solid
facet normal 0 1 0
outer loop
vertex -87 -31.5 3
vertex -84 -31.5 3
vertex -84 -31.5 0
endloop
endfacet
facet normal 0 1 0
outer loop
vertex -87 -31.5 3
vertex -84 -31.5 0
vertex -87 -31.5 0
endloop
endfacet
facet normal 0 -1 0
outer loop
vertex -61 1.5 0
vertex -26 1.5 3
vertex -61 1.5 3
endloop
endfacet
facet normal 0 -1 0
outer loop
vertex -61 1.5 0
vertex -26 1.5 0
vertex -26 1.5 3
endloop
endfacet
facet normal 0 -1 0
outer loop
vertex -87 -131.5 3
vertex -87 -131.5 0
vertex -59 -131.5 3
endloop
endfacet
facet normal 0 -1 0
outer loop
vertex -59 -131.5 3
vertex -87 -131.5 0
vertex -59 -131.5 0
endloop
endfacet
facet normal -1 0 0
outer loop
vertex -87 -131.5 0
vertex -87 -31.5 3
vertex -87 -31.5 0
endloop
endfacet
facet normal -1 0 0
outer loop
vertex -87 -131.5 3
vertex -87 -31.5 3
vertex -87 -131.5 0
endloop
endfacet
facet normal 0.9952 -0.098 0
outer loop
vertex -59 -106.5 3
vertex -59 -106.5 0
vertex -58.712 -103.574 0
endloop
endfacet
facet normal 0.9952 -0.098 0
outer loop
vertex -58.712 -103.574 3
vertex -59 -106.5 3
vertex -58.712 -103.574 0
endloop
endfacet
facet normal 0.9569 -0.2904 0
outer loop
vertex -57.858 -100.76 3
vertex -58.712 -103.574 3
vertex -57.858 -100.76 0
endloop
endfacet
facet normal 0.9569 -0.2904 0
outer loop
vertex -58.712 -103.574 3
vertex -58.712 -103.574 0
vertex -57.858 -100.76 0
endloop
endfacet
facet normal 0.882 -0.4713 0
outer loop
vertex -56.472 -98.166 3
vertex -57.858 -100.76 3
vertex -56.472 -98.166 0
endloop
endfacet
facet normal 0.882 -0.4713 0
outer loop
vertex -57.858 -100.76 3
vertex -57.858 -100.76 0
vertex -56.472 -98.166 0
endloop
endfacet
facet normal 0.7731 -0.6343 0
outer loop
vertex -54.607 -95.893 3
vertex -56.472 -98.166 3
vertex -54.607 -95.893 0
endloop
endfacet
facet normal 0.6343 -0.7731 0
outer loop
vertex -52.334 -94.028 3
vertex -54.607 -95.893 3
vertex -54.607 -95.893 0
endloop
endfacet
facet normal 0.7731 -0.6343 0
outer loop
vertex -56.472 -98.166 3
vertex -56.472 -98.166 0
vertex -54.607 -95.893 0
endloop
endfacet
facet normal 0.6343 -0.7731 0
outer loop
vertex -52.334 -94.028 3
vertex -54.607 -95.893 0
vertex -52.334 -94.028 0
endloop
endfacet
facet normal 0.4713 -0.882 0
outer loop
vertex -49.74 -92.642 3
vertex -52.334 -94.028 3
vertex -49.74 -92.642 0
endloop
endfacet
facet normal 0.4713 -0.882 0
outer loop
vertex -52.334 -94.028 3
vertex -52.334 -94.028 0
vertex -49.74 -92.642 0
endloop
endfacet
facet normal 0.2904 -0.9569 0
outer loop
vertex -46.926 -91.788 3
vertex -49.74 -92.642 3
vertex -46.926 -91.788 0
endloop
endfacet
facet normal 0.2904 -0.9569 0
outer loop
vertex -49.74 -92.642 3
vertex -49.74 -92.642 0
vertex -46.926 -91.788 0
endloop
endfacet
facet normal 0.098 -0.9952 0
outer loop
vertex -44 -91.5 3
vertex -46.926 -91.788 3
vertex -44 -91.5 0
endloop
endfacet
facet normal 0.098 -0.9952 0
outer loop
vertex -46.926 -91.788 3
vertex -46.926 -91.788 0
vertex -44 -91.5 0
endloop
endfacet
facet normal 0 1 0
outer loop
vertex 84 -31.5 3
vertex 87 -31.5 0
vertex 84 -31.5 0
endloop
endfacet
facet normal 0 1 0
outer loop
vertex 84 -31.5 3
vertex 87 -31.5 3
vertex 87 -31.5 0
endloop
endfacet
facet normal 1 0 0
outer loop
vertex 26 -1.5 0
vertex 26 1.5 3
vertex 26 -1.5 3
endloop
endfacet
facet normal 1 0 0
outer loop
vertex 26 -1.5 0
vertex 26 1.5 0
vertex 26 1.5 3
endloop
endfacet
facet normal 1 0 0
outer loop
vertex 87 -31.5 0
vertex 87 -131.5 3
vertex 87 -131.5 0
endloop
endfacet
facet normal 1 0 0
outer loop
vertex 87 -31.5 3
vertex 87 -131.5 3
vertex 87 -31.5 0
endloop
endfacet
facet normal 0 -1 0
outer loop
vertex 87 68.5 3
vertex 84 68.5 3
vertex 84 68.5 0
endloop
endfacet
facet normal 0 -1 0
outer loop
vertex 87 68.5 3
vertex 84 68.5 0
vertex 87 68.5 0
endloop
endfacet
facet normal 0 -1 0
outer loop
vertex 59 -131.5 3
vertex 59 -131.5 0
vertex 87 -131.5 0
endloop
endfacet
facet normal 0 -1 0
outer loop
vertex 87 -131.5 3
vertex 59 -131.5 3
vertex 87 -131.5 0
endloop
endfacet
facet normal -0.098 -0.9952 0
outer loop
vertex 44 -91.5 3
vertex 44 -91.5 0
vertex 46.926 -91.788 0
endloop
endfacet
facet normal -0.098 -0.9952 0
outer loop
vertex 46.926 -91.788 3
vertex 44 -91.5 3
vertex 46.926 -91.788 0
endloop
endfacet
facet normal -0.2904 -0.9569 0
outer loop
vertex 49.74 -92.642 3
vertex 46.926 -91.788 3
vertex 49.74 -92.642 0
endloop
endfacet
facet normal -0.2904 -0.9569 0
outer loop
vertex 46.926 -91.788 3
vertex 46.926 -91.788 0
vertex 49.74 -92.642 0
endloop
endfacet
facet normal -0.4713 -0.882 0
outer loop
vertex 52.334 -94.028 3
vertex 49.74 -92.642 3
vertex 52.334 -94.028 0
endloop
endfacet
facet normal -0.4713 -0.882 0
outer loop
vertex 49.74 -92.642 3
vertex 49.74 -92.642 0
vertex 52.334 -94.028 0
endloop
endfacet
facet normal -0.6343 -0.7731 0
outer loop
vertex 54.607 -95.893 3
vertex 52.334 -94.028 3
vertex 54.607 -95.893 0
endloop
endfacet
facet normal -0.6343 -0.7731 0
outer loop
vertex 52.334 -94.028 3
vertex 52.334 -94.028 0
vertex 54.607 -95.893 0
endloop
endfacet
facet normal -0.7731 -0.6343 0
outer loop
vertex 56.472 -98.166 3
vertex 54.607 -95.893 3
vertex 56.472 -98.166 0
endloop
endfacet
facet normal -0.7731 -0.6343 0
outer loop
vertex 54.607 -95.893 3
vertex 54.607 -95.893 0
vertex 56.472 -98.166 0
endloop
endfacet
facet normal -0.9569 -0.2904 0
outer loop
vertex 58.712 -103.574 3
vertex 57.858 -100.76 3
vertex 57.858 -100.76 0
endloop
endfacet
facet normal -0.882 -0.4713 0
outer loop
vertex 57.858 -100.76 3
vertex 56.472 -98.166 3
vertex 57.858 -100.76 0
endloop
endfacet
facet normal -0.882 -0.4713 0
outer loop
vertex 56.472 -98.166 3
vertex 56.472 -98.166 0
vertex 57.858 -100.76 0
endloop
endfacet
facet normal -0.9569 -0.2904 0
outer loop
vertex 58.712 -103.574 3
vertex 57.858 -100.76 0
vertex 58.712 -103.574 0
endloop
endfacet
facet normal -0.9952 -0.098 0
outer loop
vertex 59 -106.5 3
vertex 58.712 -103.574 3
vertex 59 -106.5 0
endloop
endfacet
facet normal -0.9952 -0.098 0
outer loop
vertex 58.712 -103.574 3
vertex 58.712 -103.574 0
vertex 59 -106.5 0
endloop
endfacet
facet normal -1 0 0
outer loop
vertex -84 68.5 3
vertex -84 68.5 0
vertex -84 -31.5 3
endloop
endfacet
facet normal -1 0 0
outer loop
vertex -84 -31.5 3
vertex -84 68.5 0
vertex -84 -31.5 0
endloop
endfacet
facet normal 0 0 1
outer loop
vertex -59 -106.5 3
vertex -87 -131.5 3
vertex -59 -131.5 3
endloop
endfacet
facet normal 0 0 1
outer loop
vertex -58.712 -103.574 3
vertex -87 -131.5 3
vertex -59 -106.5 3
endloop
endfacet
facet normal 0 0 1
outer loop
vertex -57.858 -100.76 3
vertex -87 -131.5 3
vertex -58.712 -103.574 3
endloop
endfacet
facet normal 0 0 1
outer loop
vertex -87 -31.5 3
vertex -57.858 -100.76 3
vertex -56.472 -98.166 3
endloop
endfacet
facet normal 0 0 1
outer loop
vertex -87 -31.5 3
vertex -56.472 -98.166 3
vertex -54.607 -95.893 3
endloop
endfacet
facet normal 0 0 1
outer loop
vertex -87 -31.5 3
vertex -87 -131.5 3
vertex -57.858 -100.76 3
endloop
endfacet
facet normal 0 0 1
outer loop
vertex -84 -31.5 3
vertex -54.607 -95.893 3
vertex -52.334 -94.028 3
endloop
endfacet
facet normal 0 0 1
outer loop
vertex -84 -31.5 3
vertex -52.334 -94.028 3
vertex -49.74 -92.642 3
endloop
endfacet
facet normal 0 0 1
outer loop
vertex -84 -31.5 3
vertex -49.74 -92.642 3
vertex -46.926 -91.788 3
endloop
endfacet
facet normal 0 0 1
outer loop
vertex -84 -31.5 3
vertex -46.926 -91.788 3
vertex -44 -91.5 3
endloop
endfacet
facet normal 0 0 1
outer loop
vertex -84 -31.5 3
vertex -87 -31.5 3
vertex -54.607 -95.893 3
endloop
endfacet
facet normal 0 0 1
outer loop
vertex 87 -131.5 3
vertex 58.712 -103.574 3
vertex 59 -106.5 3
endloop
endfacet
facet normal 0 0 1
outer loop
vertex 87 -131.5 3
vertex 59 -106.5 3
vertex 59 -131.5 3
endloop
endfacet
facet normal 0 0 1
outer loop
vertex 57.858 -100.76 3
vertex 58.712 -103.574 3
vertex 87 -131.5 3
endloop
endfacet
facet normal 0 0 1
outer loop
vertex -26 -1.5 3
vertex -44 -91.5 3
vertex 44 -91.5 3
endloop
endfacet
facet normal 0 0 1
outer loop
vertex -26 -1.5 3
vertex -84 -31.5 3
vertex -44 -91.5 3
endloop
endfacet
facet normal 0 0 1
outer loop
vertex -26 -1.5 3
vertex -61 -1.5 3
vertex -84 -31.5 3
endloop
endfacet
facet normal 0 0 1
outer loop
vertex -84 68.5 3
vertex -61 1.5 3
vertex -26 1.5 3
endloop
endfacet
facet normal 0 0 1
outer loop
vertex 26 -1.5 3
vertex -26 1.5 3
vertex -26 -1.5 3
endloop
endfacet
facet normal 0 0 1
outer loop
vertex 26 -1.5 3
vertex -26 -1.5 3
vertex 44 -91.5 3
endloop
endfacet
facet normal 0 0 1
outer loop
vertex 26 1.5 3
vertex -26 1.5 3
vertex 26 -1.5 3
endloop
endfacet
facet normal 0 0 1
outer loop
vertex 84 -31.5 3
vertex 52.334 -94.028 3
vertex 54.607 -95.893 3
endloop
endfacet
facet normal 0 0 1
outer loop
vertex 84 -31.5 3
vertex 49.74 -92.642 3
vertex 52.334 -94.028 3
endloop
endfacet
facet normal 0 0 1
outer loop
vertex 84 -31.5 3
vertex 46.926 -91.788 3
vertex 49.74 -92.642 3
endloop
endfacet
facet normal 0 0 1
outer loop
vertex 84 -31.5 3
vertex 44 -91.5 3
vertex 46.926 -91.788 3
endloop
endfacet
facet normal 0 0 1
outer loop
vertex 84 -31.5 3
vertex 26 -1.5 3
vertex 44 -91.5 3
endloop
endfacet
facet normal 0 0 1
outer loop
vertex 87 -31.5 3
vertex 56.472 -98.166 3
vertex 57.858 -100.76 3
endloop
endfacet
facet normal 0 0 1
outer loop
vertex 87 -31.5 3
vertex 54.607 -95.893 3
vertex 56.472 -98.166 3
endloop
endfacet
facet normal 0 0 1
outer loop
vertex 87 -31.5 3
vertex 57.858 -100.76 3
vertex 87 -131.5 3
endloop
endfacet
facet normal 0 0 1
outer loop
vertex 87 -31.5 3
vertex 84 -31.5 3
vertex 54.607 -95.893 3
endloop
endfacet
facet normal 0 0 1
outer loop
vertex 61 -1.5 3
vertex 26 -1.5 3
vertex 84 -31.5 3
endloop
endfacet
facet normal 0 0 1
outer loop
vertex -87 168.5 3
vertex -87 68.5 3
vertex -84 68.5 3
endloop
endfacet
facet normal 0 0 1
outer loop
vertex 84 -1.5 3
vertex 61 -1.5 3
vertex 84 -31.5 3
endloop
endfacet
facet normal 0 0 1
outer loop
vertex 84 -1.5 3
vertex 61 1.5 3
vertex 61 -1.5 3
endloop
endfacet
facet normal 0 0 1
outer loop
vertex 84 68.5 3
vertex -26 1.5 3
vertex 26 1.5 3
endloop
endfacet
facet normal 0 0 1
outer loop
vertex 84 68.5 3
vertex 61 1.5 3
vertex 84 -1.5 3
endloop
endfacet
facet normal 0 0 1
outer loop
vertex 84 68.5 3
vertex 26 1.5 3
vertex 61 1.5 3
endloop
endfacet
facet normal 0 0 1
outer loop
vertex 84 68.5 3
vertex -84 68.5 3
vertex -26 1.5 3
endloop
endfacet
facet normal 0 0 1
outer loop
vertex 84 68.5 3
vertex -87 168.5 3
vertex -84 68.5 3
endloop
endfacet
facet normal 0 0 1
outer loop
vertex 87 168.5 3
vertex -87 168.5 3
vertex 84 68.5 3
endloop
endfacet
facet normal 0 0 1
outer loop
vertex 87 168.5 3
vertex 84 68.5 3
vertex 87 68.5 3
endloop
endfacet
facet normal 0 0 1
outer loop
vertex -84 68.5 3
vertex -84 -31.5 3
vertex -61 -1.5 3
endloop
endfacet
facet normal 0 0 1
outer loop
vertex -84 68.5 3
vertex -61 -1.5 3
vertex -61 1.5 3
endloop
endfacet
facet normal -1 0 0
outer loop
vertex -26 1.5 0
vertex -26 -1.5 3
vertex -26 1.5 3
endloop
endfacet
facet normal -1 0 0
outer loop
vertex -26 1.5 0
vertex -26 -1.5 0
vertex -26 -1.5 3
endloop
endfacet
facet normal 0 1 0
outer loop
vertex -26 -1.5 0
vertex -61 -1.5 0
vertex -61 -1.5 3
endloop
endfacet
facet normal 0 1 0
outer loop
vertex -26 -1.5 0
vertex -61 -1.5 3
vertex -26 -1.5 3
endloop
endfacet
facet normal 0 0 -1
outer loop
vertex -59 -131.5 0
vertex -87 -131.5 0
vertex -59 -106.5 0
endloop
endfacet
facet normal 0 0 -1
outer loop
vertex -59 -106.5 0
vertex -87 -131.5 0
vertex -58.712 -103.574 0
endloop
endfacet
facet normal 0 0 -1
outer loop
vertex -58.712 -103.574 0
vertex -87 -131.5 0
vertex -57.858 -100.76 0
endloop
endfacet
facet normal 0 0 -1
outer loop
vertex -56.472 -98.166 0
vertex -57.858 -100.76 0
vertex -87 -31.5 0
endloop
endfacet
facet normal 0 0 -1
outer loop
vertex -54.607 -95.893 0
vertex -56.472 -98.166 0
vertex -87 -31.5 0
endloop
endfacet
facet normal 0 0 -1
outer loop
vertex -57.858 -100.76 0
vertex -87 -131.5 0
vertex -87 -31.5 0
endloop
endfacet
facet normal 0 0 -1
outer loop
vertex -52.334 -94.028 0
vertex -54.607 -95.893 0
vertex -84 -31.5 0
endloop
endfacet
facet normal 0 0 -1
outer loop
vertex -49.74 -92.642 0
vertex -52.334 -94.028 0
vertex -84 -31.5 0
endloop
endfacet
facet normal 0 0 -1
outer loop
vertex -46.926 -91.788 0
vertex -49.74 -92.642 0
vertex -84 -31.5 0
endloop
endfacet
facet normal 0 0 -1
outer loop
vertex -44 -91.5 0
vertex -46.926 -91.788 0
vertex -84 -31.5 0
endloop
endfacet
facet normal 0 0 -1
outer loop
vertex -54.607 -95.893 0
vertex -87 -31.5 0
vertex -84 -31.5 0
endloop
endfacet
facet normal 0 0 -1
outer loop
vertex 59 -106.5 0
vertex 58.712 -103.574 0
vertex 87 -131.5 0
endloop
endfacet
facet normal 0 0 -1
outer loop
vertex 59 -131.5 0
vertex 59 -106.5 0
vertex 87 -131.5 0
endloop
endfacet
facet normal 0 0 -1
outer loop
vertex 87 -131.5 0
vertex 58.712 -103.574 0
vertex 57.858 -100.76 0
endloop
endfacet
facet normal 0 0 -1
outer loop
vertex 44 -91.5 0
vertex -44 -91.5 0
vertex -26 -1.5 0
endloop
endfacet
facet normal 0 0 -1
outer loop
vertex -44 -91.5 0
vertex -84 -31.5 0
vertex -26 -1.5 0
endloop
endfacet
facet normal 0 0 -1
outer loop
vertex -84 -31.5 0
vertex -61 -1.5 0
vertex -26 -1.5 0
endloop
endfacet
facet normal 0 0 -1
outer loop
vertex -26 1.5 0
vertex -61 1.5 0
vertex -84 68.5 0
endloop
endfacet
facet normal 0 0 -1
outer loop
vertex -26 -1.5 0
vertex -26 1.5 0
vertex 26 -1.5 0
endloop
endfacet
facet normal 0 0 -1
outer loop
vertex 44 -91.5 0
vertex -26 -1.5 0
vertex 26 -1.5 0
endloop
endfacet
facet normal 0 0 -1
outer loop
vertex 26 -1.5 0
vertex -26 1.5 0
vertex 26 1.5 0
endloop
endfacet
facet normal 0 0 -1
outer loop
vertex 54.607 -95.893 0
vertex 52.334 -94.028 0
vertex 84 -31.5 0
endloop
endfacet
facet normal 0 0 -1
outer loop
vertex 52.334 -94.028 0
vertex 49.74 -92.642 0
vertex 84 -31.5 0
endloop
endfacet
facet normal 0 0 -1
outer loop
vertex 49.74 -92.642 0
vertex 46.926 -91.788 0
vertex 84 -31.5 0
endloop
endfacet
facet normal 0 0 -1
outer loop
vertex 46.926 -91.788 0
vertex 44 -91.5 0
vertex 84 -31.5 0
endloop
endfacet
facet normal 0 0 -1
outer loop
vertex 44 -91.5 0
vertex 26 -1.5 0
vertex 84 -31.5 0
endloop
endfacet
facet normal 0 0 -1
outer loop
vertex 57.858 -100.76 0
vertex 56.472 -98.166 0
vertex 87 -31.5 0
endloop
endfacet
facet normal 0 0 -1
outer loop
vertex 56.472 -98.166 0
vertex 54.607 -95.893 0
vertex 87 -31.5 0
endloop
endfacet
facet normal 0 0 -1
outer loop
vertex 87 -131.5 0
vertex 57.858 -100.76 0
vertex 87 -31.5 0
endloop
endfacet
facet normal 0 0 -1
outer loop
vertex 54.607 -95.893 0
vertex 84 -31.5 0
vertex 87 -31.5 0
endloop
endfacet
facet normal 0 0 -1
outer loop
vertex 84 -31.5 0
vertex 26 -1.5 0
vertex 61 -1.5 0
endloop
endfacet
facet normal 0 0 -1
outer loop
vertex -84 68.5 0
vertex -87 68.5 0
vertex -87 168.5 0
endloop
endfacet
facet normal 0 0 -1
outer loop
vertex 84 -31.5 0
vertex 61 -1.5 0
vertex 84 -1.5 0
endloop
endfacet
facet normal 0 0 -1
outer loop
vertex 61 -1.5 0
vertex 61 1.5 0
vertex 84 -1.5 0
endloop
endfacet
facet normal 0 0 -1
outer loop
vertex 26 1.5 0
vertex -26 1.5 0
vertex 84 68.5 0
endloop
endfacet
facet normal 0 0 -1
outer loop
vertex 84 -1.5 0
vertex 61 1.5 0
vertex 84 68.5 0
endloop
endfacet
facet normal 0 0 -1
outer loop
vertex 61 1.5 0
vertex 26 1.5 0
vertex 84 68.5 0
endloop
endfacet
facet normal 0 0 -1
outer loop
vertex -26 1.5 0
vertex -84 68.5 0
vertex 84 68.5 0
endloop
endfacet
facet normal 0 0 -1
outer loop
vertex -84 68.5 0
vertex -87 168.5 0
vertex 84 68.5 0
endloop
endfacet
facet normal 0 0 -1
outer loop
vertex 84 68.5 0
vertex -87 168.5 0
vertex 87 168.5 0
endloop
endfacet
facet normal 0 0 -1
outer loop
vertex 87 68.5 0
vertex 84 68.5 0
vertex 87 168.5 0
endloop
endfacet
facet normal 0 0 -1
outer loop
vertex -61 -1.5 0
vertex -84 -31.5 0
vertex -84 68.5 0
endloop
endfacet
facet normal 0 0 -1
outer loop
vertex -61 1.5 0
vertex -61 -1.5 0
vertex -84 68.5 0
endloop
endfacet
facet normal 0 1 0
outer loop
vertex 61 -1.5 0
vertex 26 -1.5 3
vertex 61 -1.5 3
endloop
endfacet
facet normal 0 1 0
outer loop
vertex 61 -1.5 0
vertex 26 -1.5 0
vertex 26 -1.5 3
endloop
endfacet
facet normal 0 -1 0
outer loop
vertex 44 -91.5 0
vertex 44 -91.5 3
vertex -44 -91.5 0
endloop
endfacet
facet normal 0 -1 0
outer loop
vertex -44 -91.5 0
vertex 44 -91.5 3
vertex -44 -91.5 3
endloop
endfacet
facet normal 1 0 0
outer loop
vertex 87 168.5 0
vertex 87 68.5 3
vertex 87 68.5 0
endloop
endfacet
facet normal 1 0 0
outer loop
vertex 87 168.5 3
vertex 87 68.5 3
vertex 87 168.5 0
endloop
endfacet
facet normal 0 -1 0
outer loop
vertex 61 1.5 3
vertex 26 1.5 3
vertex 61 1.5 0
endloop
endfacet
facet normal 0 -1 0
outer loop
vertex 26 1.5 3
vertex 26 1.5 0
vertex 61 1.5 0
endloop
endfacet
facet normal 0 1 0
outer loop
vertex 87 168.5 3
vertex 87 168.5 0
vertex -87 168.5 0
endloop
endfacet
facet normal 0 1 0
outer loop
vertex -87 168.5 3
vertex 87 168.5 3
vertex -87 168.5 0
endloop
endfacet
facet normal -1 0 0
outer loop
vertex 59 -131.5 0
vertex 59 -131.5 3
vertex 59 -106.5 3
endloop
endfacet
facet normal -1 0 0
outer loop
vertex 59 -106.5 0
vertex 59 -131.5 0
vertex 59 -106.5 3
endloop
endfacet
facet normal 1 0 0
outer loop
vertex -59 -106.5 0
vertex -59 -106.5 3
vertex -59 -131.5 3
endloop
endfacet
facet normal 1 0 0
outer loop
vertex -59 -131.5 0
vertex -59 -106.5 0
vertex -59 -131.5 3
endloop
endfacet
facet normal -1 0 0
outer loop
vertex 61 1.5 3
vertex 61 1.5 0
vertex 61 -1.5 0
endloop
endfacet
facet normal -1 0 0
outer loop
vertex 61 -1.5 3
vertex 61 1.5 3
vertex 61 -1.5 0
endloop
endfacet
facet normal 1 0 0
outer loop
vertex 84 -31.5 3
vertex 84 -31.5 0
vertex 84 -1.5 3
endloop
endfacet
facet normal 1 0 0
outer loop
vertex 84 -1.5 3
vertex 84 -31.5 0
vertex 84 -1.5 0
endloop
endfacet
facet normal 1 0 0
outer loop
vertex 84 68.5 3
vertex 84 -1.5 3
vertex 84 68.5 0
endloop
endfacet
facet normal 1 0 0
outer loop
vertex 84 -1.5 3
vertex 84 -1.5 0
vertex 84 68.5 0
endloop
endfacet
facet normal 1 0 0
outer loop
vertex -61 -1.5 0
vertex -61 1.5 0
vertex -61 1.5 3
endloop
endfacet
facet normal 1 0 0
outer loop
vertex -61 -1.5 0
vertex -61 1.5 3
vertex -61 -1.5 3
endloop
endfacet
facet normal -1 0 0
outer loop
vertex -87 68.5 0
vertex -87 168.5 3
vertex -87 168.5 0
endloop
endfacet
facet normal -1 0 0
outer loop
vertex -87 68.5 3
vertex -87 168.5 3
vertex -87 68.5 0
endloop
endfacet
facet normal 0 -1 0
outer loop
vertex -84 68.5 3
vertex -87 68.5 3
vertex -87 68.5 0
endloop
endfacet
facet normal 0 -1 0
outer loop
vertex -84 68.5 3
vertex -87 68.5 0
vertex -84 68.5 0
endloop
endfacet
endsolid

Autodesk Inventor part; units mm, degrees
ref_plane "YZ Plane" through (0, 0, 0) normal (1, 0, 0) x (0, 1, 0)
ref_plane "XZ Plane" through (0, 0, 0) normal (0, 1, 0) x (-1, 0, 0)
ref_plane "XY Plane" through (0, 0, 0) normal (0, 0, 1) x (1, 0, 0)
sketch "Sketch1" plane through (0, 0, 0) normal (0, 0, 1) x (1, 0, 0)
  line L0 (-84, -131.5) -> (84, -131.5)
  line L1 (84, -131.5) -> (84, 168.5)
  line L2 (84, 168.5) -> (-84, 168.5)
  line L3 (-84, 168.5) -> (-84, -131.5)
  line L4 (-84, 1.5) -> (-84, -1.5) projected
  line L5 (84, -1.5) -> (84, 1.5) projected
  line L6 (61, -1.5) -> (84, -1.5) projected
  line L7 (26, -1.5) -> (61, -1.5) projected
  line L8 (61, 1.5) -> (61, -1.5) projected
  line L9 (26, 1.5) -> (61, 1.5) projected
  line L10 (26, 1.5) -> (26, -1.5) projected
  point P0 (0, 0)
  dimension "d0" = 300
  dimension "d1" = 170
extrude "Extrusion1" add sketch "Sketch1" along normal blind 3
sketch "Sketch2" plane through (0, 0, 0) normal (0, 0, -1) x (-1, 0, 0)
  line L0 (84, 1.5) -> (84, -1.5)
  line L1 (84, -1.5) -> (61, -1.5)
  line L2 (61, 1.5) -> (61, -1.5)
  line L3 (26, 1.5) -> (61, 1.5)
  line L4 (26, -1.5) -> (26, 1.5)
  line L5 (26, -1.5) -> (-26, -1.5)
  line L6 (-26, 1.5) -> (-26, -1.5)
  line L7 (-61, 1.5) -> (-26, 1.5)
  line L8 (-61, -1.5) -> (-61, 1.5)
  line L9 (-61, -1.5) -> (-84, -1.5)
  line L10 (-84, -1.5) -> (-84, 1.5)
  line L11 (-84, 1.5) -> (-61, 1.5)
  line L12 (61, 1.5) -> (84, 1.5)
  line L13 (61, -1.5) -> (26, -1.5)
  line L14 (-26, 1.5) -> (26, 1.5)
  line L15 (-26, -1.5) -> (-61, -1.5)
  point P0 (0, 0)
extrude "Extrusion2" cut sketch "Sketch2" against normal blind 10 contours L2 L13 L4 L3
sketch "Sketch3" plane through (0, 0, 3) normal (0, 0, 1) x (1, 0, 0)
  line L0 (84, -131.5) -> (84, 168.5) projected
  line L1 (84, -131.5) -> (87, -131.5)
  line L2 (87, -131.5) -> (87, -31.5)
  line L3 (87, -31.5) -> (84, -31.5)
  line L4 (84, -31.5) -> (84, -131.5)
  line L5 (-61, -1.5) -> (-26, -1.5) projected
  line L6 (-26, -1.5) -> (-26, 1.5) projected
  line L7 (-26, 1.5) -> (-61, 1.5) projected
  line L8 (-61, 1.5) -> (-61, -1.5) projected
  line L9 (26, 1.5) -> (26, -1.5) projected
  line L10 (26, -1.5) -> (61, -1.5) projected
  line L11 (61, -1.5) -> (61, 1.5) projected
  line L12 (61, 1.5) -> (26, 1.5) projected
  line L13 (-84, 168.5) -> (84, 168.5) projected
  line L14 (84, 168.5) -> (84, -131.5) projected
  line L15 (84, -131.5) -> (-84, -131.5) projected
  line L16 (-84, -131.5) -> (-84, 168.5) projected
  line L17 (87, 168.5) -> (84, 168.5)
  line L18 (84, 68.5) -> (87, 68.5)
  line L19 (87, 68.5) -> (87, 168.5)
  line L20 (84, 168.5) -> (84, 68.5)
  line L21 (-84, -31.5) -> (-87, -31.5)
  line L22 (-87, -131.5) -> (-84, -131.5)
  line L23 (-84, -131.5) -> (-84, -31.5)
  line L24 (-87, -31.5) -> (-87, -131.5)
  line L25 (-84, 168.5) -> (-87, 168.5)
  line L26 (-87, 68.5) -> (-84, 68.5)
  line L27 (-84, 68.5) -> (-84, 168.5)
  line L28 (-87, 168.5) -> (-87, 68.5)
  point P0 (0, 0)
  dimension "d6" = 100
  dimension "d7" = 3
  dimension "d10" = 200
  dimension "d13" = 171
extrude "Extrusion3" add sketch "Sketch3" against normal up to surface (3 mm away) contours L0 L3 L2 L1 | L22 L24 L21 L16 | L0 L17 L19 L18 | L26 L28 L25 L16
sketch "Sketch4" plane through (0, 0, 3) normal (0, 0, 1) x (1, 0, 0)
  line L0 (-59, -131.5) -> (59, -131.5)
  line L1 (59, -131.5) -> (59, -91.5)
  line L2 (59, -91.5) -> (-59, -91.5)
  line L3 (-59, -91.5) -> (-59, -131.5)
  line L4 (-87, -131.5) -> (87, -131.5) projected
  line L5 (87, -131.5) -> (87, -31.5) projected
  line L6 (-87, -31.5) -> (-87, -131.5) projected
  point P0 (0, 0)
  dimension "d18" = 28
  dimension "d19" = 28
  dimension "d20" = 40
extrude "Extrusion4" cut sketch "Sketch4" against normal blind 10
fillet "Fillet1" radius 15 2 edges at (59, -91.5, 1.5) (-59, -91.5, 1.5)
properties part number "Pared_Lateral"
